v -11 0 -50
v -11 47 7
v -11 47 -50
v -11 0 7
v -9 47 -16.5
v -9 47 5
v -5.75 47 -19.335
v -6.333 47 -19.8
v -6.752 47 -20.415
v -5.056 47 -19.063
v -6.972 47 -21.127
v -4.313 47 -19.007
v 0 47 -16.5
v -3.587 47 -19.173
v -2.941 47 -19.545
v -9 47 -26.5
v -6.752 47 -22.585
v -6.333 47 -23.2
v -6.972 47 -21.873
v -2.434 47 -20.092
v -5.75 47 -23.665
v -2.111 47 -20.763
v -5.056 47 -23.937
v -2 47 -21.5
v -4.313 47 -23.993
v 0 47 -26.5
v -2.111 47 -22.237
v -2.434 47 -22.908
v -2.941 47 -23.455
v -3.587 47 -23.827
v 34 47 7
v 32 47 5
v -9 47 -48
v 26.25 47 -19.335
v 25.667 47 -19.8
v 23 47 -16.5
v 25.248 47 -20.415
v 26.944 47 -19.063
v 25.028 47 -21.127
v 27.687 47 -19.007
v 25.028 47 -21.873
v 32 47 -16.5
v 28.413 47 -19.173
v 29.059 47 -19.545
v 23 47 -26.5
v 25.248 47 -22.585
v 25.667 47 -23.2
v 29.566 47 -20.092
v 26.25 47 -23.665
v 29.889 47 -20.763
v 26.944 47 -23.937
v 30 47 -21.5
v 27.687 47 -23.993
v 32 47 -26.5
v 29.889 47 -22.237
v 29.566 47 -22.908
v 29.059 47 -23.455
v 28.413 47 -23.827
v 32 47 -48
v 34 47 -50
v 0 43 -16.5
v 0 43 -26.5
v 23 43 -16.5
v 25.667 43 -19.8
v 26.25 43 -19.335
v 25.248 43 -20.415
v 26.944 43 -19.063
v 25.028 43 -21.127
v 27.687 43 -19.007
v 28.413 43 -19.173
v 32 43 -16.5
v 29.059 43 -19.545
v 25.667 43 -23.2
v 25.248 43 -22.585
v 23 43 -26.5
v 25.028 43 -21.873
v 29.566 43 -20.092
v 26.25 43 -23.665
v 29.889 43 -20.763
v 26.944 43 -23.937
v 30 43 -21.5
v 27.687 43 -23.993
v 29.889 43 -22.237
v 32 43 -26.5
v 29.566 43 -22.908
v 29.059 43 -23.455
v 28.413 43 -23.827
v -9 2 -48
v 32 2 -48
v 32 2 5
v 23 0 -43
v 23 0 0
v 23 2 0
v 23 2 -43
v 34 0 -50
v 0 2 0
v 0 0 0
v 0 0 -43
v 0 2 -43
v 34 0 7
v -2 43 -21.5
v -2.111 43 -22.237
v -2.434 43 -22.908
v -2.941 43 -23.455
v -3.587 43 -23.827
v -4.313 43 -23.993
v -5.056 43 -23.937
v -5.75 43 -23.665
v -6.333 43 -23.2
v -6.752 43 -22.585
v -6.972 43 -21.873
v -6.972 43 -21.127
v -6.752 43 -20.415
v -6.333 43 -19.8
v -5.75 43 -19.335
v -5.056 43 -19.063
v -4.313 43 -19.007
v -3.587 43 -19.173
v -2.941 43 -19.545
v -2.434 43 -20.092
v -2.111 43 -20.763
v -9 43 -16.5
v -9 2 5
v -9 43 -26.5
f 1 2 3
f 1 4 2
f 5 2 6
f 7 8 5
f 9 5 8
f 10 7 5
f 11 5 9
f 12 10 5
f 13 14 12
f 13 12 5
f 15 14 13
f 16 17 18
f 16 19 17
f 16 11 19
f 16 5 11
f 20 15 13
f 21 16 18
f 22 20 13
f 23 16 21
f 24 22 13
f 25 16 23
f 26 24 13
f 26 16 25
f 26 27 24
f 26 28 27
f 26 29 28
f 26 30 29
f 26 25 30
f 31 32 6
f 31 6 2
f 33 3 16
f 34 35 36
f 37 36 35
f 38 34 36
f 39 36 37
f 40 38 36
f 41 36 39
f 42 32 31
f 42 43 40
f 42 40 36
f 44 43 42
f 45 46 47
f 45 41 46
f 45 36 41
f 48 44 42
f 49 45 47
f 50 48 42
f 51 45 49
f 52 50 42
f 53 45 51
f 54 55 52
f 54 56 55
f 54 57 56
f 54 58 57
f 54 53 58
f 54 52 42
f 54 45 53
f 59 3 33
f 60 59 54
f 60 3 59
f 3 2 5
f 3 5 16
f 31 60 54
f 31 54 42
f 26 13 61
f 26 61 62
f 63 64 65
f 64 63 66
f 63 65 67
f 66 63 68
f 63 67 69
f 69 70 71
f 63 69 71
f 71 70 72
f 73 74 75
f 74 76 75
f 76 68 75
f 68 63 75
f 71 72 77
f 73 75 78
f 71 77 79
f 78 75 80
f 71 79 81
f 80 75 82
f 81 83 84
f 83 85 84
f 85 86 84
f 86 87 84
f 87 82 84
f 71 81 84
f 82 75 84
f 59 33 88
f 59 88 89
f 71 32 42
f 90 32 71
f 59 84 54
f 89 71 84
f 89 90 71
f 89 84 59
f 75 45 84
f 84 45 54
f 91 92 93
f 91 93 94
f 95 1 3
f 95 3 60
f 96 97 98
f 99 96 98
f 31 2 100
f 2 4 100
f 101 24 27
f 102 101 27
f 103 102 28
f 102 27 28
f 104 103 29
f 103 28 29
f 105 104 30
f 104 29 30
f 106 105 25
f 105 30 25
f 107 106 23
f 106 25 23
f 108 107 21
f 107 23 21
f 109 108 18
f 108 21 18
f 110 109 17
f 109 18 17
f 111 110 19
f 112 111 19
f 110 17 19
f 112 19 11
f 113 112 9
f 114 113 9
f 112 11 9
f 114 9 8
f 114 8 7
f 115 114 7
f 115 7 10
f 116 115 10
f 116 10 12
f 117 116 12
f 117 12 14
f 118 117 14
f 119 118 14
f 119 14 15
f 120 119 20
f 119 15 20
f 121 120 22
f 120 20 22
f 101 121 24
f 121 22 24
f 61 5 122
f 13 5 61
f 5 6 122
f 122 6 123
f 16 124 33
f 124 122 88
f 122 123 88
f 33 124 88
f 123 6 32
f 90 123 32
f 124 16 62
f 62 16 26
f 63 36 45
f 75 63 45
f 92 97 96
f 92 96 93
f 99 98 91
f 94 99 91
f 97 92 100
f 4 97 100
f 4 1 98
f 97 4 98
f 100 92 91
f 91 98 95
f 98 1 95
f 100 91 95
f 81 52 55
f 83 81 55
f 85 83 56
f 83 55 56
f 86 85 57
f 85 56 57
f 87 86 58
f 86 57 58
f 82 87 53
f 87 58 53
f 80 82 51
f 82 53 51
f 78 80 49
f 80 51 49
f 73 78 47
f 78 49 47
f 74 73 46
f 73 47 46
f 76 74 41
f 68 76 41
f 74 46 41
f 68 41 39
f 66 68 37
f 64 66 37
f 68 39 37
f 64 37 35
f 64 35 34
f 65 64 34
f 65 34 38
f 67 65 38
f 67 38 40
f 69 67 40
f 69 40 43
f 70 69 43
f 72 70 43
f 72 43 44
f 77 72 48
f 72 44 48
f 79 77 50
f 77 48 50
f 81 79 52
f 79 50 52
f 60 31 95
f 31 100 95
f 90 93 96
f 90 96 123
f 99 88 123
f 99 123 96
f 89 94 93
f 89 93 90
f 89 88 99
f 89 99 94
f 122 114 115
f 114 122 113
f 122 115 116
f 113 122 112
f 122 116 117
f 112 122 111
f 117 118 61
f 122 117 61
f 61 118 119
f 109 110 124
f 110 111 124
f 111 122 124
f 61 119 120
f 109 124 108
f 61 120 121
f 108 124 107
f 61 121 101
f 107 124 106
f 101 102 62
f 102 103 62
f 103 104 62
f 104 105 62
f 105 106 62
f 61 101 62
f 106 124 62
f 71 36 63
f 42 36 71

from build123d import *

# Parameters (mm, degrees)
ESQUISSE1_W        = 45
ESQUISSE1_H        = 57
ESQUISSE1_W_2      = 23
ESQUISSE1_H_2      = 43
BOSS_EXTRU_1_DEPTH = 2
ESQUISSE2_W        = 45
ESQUISSE2_H        = 57
ESQUISSE2_W_2      = 41
ESQUISSE2_H_2      = 53
BOSS_EXTRU_2_DEPTH = 45
ESQUISSE3_W        = 9
ESQUISSE3_H        = 10
ESQUISSE3_R        = 2.5
BOSS_EXTRU_3_DEPTH = 4


with BuildPart() as part:
    # Esquisse1 → Boss.-Extru.1 (new body)
    with BuildSketch(Plane(origin=(0, 0, 0), x_dir=(1, 0, 0), z_dir=(0, 1, 0))):
        with Locations((11.5, 21.5)):
            Rectangle(ESQUISSE1_W, ESQUISSE1_H)
        with Locations((11.5, 21.5)):
            Rectangle(ESQUISSE1_W_2, ESQUISSE1_H_2, mode=Mode.SUBTRACT)
    extrude(amount=BOSS_EXTRU_1_DEPTH)

    # Esquisse2 → Boss.-Extru.2 (add)
    with BuildSketch(Plane(origin=(0, 2, 0), x_dir=(1, 0, 0), z_dir=(0, 1, 0))):
        with Locations((11.5, 21.5)):
            Rectangle(ESQUISSE2_W, ESQUISSE2_H)
        with Locations((11.5, 21.5)):
            Rectangle(ESQUISSE2_W_2, ESQUISSE2_H_2, mode=Mode.SUBTRACT)
    extrude(amount=BOSS_EXTRU_2_DEPTH)

    # Esquisse3 → Boss.-Extru.3 (add)
    with BuildSketch(Plane(origin=(0, 47, 0), x_dir=(1, 0, 0), z_dir=(0, 1, 0))):
        with Locations((-4.5, 21.5)):
            Rectangle(ESQUISSE3_W, ESQUISSE3_H)
        with Locations((-4.5, 21.5)):
            Circle(ESQUISSE3_R, mode=Mode.SUBTRACT)
        with Locations((27.5, 21.5)):
            Rectangle(ESQUISSE3_W, ESQUISSE3_H)
        with Locations((27.5, 21.5)):
            Circle(ESQUISSE3_R, mode=Mode.SUBTRACT)
    extrude(amount=-BOSS_EXTRU_3_DEPTH)


solid = part.part
